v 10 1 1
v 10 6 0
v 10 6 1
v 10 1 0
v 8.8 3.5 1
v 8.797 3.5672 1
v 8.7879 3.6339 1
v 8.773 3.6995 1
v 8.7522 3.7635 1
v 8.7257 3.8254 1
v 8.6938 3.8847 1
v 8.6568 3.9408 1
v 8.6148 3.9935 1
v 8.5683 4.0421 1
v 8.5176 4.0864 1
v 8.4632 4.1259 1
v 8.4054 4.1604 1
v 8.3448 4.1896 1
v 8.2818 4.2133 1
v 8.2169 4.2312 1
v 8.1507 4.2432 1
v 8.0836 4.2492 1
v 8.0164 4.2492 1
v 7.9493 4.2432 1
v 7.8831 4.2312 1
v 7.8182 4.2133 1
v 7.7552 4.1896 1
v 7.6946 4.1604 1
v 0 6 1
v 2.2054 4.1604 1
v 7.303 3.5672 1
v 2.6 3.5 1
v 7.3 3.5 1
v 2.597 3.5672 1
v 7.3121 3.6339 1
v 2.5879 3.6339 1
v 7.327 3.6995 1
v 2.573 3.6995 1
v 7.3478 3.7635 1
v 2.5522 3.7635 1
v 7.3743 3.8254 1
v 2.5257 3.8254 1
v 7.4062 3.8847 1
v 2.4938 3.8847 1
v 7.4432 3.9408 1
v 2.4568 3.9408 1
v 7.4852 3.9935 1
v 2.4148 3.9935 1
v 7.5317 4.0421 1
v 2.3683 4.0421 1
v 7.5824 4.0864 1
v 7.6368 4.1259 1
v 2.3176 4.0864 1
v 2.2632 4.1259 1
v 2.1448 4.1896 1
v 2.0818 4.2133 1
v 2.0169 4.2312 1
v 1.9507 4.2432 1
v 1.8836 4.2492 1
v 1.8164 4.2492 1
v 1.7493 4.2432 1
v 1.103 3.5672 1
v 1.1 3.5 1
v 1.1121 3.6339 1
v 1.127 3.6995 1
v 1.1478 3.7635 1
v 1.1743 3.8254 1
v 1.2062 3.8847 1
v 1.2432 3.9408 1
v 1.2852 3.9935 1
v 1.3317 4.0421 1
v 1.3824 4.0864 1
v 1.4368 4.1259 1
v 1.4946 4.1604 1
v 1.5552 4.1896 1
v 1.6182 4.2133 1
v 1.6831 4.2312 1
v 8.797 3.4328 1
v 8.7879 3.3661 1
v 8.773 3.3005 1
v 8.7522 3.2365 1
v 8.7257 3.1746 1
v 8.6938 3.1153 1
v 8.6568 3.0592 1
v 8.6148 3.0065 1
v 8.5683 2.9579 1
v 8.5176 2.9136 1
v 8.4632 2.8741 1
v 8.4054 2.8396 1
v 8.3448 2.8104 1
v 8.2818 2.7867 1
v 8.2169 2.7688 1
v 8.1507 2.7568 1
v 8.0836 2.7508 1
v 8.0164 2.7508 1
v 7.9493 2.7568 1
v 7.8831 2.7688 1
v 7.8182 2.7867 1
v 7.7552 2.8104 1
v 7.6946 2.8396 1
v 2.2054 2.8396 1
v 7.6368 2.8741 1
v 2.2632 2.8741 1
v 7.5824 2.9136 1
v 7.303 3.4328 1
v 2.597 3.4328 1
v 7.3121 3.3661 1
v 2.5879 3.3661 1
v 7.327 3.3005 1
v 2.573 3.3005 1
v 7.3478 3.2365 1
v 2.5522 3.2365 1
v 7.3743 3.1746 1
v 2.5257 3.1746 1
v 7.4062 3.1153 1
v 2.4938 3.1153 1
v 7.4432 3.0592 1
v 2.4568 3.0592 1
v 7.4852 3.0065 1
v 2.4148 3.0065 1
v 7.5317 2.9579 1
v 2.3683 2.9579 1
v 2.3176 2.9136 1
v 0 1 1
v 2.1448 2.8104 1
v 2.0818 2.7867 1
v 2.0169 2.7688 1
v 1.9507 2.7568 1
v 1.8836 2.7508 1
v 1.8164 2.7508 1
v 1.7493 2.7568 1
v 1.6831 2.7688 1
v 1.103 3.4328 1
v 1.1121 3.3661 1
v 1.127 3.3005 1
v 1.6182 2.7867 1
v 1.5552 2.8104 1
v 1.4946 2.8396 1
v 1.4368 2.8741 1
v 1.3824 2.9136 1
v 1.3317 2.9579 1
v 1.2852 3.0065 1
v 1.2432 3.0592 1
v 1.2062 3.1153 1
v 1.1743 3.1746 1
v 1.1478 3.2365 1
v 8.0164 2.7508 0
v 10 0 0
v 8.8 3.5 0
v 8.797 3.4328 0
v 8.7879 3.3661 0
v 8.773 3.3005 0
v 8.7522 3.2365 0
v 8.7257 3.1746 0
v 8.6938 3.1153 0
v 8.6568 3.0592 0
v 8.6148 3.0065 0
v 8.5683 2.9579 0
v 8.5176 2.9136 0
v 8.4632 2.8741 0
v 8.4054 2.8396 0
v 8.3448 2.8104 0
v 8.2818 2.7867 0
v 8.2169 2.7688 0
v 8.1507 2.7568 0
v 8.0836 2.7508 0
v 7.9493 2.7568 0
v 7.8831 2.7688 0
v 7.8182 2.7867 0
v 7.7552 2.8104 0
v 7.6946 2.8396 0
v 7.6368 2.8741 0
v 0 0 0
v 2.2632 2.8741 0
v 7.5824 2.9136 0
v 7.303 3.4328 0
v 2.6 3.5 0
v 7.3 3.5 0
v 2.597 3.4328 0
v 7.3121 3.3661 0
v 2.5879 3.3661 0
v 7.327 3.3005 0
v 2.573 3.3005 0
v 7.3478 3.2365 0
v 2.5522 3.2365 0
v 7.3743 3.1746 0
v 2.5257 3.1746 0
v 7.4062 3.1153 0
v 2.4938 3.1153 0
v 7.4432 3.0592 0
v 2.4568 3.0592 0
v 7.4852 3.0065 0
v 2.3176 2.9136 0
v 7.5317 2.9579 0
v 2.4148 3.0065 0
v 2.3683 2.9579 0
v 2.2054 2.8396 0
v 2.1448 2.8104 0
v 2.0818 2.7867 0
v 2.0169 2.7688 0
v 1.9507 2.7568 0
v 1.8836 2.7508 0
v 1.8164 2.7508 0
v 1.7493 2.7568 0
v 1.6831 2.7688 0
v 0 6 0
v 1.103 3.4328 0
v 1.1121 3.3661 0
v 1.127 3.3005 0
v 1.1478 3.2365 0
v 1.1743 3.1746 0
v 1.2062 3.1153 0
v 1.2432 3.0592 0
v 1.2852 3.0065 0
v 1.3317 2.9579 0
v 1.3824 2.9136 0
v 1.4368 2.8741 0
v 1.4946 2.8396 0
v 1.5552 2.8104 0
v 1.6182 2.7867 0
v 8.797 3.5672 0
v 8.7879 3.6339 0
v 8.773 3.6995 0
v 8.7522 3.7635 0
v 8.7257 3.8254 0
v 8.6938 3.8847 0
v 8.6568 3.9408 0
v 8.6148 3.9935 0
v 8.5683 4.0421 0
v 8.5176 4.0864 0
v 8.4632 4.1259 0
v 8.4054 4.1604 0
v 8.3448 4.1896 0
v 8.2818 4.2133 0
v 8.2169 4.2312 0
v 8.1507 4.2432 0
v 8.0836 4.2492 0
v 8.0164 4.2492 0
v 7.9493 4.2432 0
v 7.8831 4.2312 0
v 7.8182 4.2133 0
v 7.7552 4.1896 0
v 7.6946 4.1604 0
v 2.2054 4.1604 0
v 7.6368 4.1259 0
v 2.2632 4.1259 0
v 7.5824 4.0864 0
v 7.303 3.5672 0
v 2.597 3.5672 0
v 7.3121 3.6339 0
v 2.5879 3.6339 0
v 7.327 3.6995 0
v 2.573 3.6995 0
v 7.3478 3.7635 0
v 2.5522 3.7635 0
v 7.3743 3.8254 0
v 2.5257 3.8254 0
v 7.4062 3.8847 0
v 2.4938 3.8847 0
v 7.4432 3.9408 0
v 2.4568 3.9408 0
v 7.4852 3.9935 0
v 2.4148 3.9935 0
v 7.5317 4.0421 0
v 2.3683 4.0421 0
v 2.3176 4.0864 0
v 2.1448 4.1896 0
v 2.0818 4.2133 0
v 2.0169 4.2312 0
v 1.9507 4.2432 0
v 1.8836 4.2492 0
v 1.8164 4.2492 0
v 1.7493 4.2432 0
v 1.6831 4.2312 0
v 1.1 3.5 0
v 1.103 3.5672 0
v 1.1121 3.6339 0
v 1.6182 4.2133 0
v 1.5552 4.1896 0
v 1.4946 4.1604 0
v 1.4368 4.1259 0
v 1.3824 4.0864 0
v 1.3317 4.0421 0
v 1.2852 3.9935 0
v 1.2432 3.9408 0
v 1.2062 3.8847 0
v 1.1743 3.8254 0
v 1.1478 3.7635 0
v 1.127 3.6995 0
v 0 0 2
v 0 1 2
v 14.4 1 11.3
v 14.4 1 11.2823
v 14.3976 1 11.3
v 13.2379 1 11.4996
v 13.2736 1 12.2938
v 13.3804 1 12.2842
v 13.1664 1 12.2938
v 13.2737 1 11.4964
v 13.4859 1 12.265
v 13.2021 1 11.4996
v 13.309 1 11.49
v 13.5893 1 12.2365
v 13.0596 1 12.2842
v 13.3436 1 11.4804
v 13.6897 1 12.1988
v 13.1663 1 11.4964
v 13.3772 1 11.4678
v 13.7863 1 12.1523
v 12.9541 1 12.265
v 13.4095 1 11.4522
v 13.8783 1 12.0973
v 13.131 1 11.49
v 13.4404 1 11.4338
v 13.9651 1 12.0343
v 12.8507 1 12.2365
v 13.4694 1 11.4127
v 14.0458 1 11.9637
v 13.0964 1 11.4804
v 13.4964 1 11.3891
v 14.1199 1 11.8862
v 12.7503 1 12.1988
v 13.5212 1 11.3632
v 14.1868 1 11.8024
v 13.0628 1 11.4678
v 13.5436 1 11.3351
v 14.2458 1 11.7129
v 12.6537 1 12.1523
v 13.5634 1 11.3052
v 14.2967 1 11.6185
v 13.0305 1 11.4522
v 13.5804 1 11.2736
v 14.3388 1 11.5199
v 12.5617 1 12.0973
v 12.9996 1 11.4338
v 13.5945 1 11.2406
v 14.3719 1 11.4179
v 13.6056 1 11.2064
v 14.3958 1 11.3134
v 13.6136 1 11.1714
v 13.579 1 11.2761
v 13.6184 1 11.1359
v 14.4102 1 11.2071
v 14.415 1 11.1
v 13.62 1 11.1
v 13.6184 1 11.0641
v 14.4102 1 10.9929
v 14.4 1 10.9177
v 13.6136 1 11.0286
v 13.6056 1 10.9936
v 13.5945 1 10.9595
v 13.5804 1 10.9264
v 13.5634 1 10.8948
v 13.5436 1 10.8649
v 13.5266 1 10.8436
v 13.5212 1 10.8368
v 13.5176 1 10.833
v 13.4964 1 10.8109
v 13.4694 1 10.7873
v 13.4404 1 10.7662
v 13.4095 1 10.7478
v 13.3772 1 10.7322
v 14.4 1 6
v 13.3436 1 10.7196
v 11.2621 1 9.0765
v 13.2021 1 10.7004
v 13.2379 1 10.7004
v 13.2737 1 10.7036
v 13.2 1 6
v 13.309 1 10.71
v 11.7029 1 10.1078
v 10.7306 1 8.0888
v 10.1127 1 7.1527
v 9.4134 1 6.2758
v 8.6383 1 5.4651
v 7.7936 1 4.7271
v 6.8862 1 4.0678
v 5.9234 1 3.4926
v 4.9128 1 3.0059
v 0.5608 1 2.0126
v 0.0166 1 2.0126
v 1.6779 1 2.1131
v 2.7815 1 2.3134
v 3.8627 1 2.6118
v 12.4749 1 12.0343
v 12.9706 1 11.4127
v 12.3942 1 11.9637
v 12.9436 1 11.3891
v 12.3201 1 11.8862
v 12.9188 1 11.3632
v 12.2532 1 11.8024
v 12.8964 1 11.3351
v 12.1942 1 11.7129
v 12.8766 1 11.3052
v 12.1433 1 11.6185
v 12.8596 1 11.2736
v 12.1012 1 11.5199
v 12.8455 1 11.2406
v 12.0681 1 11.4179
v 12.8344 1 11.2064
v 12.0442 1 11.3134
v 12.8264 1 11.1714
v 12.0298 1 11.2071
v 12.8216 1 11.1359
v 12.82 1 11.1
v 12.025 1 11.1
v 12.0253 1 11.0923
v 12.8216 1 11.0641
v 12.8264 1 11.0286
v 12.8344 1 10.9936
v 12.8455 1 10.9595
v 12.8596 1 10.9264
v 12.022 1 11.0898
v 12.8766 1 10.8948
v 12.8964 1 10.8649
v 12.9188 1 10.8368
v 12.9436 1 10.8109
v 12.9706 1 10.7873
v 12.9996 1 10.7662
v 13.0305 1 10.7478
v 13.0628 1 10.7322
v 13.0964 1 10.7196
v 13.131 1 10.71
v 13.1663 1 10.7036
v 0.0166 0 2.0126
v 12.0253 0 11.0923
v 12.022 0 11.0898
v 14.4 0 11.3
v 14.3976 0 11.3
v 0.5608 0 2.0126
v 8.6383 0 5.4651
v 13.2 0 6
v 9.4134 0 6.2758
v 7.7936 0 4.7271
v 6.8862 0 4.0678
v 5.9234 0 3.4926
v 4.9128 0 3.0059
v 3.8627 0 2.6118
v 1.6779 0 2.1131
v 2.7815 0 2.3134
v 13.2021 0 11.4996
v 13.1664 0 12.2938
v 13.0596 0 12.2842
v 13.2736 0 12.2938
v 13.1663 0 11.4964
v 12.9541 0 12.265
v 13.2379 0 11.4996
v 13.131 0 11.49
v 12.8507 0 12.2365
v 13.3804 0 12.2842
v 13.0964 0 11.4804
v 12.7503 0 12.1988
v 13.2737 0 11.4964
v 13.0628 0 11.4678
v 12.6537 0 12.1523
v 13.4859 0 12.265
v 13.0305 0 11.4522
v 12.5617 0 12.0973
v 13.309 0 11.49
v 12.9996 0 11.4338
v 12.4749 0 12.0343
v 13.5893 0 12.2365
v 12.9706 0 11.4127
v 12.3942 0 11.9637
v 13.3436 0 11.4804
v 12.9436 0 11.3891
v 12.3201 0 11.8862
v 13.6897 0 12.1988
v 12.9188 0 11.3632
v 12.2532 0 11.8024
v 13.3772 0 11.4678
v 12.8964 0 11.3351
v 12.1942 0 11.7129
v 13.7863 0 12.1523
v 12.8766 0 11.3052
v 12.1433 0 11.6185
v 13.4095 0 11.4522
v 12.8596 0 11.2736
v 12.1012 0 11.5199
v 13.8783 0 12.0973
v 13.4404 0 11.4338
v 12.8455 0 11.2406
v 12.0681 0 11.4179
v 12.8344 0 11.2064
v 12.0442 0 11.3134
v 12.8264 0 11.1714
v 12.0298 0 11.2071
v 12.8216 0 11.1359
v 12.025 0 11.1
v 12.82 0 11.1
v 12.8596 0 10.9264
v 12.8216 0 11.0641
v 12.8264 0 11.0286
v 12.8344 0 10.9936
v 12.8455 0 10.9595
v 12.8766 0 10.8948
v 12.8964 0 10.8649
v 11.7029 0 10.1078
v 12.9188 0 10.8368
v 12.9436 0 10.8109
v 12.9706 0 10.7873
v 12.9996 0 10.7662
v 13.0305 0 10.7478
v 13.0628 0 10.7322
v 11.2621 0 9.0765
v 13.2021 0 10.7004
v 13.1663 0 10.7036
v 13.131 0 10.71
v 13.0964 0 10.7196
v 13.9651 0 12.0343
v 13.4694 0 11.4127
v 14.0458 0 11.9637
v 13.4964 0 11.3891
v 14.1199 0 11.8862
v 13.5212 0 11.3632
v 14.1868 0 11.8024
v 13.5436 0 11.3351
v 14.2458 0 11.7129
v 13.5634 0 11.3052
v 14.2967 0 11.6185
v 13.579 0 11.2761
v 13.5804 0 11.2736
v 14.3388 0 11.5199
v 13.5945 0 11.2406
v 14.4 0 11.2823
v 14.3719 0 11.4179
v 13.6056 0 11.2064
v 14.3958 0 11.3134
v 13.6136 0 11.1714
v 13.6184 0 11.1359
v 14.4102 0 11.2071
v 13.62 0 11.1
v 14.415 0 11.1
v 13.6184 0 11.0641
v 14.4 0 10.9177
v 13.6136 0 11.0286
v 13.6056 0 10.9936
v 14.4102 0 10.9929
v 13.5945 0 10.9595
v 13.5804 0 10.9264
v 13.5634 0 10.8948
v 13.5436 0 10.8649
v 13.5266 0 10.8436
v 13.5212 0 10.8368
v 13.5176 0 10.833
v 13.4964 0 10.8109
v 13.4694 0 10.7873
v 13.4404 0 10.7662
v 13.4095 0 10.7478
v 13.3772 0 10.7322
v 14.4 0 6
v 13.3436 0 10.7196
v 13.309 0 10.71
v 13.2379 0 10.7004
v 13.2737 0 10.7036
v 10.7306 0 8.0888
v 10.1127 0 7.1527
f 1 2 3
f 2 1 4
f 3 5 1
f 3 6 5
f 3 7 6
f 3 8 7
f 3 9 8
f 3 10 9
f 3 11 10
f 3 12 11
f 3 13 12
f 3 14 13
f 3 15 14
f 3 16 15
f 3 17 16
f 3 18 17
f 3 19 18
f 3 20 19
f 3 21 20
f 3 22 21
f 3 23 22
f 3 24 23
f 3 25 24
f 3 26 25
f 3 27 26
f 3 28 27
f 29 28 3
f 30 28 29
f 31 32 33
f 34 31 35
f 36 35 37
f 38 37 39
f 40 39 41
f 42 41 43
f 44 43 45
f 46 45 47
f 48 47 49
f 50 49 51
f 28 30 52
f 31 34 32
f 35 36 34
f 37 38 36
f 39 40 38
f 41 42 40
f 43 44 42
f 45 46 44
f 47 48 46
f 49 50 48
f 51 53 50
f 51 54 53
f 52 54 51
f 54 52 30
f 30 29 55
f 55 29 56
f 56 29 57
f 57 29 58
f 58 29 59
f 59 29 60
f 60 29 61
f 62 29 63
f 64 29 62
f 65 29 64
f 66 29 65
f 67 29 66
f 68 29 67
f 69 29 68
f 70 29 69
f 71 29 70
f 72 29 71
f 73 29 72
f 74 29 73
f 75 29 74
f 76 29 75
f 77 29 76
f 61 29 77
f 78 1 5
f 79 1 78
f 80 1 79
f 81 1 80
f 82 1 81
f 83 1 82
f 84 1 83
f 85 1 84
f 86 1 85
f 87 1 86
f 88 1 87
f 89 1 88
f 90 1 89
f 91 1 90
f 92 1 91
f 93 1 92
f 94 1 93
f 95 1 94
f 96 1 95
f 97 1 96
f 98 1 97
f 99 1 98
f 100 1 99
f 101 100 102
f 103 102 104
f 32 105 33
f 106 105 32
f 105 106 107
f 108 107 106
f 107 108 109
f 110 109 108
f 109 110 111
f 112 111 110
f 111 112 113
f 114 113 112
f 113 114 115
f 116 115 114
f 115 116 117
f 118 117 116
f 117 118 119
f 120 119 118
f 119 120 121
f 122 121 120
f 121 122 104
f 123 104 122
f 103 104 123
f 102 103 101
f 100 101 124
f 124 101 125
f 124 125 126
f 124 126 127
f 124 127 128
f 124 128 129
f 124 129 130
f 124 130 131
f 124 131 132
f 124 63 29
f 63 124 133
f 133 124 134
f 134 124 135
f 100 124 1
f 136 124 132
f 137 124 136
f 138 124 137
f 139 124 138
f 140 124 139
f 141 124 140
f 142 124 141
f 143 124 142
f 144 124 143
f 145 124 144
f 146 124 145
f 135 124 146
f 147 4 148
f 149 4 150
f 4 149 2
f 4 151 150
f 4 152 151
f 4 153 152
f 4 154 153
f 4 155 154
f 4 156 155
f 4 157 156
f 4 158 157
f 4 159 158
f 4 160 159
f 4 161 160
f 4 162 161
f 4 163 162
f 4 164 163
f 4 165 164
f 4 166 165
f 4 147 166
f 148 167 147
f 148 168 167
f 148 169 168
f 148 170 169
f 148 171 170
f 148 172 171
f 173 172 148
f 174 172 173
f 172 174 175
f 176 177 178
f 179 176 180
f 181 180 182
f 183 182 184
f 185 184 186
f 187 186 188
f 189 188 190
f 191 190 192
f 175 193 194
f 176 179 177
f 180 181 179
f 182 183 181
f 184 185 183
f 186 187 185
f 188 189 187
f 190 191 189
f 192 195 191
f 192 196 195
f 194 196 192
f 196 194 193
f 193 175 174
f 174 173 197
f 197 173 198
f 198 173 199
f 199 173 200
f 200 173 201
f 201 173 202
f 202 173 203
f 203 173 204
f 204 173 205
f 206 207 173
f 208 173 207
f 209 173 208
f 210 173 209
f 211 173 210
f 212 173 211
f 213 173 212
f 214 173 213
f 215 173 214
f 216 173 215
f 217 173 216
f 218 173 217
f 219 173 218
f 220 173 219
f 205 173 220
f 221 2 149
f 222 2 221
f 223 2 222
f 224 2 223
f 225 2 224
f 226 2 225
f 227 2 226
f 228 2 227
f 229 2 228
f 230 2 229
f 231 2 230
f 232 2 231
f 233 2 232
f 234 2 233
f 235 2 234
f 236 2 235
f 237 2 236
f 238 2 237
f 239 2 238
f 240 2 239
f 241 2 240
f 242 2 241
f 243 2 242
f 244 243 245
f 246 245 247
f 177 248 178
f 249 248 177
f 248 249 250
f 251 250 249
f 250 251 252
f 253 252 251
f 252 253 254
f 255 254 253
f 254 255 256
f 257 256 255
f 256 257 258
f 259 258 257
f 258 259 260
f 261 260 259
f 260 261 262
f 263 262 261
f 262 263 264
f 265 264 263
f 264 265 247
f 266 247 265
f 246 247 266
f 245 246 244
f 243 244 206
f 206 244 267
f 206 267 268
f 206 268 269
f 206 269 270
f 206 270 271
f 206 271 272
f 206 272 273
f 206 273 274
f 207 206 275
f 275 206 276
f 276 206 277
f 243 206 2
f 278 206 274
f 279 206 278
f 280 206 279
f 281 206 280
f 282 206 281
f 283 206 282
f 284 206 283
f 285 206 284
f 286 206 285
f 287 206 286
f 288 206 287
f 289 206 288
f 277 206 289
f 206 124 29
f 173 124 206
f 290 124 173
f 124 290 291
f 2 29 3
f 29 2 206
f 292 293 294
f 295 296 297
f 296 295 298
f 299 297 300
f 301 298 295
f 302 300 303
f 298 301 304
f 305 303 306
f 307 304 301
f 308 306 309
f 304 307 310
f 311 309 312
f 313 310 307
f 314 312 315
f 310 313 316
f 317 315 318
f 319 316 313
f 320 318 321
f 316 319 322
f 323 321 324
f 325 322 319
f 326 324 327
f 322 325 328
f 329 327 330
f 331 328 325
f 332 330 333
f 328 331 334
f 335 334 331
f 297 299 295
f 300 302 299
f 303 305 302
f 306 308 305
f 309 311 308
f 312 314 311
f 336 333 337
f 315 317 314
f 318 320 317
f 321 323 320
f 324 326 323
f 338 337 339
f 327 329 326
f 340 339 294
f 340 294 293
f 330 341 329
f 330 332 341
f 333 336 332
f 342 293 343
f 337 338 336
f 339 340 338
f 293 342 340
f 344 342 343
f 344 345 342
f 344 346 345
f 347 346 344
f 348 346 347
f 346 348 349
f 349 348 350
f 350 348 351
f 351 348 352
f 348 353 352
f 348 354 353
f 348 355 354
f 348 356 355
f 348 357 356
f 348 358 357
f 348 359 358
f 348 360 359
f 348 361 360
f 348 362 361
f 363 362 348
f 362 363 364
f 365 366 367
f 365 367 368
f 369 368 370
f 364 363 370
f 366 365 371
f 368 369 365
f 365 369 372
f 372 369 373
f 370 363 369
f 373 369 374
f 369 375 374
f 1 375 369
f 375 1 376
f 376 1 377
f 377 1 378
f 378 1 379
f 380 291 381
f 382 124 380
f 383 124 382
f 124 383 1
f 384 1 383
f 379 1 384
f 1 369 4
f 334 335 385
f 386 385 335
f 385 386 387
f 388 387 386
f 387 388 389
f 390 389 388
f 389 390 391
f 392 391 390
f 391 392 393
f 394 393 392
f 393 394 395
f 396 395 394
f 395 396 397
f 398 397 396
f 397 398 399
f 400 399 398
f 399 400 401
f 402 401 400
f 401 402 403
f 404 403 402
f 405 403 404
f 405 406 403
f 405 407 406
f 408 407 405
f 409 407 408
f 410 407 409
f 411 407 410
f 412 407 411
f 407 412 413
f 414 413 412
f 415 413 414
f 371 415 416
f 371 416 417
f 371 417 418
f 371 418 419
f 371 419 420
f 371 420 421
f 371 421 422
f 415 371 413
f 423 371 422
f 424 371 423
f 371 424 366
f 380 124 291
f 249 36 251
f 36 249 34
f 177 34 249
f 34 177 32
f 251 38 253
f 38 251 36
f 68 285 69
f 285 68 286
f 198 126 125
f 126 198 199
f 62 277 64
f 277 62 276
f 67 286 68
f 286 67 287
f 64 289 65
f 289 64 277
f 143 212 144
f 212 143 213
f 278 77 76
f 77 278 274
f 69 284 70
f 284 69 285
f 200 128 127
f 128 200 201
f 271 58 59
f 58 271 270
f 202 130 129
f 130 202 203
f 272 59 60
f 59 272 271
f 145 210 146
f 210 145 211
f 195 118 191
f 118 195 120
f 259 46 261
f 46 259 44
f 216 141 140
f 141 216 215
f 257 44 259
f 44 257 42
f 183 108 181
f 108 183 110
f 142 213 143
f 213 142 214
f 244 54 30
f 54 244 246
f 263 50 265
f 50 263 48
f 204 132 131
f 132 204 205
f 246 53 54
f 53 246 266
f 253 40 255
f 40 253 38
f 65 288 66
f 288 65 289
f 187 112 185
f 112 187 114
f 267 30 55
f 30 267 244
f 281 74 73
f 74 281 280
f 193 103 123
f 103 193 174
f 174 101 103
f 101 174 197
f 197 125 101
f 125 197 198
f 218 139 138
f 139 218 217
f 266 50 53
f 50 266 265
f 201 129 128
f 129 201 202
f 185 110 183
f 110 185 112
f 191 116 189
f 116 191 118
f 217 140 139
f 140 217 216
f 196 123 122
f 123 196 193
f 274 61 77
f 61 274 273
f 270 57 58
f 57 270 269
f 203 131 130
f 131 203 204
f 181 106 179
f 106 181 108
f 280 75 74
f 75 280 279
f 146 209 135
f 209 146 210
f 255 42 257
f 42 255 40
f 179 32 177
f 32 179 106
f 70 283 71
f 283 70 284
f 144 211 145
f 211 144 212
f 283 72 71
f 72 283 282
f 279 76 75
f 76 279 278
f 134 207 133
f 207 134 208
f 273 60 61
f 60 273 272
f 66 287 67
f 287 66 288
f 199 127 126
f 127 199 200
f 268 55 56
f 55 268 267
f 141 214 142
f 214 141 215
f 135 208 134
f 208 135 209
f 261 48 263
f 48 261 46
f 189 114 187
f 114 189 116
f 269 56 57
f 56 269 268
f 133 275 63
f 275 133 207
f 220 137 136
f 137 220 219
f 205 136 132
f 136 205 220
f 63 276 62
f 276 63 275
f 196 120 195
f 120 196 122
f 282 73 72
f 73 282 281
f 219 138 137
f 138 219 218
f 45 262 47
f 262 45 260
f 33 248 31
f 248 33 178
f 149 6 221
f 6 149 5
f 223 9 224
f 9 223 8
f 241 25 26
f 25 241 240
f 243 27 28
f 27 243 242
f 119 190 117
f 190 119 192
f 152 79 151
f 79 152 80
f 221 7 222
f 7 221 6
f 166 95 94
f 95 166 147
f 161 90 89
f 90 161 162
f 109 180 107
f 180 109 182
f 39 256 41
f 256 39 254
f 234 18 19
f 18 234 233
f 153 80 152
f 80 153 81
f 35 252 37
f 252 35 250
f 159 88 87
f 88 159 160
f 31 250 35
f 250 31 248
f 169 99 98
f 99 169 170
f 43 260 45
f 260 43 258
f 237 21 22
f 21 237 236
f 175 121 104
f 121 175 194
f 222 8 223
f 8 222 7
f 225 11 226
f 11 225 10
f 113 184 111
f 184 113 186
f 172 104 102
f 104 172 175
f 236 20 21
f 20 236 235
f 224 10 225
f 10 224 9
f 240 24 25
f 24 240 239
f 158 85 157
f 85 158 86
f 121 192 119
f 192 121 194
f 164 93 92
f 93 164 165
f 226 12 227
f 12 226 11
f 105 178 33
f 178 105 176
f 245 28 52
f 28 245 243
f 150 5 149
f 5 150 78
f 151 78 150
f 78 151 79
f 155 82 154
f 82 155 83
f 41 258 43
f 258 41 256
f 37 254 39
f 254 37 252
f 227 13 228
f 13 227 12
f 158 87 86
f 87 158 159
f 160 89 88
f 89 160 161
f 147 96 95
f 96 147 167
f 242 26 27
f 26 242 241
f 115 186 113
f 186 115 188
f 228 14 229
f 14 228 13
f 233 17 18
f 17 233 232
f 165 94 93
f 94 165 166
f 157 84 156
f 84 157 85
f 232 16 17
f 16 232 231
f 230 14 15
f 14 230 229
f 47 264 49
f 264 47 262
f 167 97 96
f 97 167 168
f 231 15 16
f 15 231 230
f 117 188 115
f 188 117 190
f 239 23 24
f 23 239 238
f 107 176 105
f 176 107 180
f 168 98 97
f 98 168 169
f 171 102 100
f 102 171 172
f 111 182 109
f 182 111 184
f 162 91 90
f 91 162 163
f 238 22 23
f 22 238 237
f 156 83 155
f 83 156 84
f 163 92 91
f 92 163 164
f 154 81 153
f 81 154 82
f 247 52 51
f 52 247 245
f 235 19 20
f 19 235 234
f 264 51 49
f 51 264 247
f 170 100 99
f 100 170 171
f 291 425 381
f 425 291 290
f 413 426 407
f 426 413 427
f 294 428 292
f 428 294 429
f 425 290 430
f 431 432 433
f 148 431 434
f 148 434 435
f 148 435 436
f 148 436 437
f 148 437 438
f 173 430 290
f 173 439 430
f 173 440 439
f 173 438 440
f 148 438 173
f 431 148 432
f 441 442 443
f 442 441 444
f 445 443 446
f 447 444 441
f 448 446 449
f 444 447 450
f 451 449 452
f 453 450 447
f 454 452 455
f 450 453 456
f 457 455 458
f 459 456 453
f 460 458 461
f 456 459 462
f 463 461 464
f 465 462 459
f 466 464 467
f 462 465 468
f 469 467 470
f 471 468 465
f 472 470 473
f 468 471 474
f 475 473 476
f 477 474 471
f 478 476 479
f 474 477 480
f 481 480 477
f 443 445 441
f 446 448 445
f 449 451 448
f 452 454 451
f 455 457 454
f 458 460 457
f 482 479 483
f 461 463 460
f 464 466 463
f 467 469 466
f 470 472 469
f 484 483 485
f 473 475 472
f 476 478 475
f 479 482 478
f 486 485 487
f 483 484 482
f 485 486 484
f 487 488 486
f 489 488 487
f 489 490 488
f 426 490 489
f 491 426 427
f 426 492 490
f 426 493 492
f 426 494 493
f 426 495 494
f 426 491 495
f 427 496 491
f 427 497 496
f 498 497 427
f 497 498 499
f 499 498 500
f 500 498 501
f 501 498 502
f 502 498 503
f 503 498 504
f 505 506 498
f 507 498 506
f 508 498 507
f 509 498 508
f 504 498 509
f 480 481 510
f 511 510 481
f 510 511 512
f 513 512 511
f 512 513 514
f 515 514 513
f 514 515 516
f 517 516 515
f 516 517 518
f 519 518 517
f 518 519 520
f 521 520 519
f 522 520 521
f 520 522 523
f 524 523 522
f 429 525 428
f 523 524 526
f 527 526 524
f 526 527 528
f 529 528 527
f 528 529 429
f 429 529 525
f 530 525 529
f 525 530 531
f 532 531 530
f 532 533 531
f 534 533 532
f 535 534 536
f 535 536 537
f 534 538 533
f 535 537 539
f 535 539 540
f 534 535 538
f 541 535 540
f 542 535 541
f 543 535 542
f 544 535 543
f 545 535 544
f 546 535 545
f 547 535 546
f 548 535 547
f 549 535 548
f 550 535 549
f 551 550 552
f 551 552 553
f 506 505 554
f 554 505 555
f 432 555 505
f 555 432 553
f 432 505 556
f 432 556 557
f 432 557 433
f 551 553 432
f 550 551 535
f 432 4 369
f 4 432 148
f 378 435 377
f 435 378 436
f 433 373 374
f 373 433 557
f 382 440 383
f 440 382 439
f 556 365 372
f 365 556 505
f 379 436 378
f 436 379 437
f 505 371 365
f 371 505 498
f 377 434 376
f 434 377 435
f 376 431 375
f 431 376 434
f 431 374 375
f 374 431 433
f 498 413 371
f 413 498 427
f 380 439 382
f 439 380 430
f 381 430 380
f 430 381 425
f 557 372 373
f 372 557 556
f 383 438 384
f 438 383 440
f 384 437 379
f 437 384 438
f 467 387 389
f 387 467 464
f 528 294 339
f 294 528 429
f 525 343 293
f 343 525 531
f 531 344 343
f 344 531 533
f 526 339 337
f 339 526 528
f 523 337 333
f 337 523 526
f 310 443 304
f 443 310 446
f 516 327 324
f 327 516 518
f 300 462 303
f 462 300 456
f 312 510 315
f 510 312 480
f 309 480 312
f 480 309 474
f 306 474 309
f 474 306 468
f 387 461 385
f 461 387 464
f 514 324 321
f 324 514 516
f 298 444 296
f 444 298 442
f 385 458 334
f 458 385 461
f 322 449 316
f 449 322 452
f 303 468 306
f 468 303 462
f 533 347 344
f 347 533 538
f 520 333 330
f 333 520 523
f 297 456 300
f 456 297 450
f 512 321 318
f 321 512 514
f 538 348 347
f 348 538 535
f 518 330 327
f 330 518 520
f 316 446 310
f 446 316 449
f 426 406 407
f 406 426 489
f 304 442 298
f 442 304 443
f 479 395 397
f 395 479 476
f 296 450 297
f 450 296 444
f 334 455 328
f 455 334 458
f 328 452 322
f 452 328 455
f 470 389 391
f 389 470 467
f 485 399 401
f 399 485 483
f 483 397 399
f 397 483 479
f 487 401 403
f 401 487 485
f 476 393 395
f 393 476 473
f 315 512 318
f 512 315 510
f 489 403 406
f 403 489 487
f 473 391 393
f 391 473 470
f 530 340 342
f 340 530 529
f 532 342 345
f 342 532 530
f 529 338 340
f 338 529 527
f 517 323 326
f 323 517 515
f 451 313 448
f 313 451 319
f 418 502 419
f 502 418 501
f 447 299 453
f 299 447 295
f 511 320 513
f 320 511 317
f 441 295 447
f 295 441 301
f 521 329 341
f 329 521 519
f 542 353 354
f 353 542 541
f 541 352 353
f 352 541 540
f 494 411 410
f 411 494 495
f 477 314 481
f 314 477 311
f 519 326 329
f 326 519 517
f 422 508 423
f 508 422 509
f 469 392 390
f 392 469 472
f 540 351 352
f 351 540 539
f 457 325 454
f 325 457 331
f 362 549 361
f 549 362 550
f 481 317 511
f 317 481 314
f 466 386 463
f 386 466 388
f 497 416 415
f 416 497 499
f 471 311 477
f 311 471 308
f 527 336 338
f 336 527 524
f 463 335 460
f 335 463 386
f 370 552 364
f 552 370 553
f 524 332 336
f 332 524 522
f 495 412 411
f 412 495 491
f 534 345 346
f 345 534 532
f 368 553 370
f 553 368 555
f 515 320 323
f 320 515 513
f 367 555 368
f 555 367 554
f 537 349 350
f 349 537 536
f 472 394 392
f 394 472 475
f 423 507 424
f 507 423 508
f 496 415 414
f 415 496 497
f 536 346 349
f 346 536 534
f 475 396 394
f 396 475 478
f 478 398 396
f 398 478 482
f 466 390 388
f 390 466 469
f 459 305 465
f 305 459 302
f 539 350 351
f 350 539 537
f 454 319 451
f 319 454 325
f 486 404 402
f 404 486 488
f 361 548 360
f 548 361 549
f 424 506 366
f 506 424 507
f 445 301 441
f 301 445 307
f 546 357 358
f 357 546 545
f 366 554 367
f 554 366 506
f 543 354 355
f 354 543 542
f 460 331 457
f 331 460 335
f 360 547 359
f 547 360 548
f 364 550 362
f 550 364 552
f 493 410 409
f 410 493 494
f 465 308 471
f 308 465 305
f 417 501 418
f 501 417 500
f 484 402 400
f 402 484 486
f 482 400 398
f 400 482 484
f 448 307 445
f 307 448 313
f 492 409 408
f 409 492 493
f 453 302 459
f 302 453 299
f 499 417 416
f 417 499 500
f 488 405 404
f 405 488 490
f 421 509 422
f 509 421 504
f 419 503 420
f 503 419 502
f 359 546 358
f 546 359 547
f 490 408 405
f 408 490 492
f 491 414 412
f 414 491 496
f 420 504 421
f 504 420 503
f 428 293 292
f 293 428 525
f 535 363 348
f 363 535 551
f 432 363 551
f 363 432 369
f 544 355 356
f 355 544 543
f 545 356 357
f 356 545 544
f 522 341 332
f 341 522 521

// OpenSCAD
$fn = 70;

difference() {
    translate([0,1,0]) {
        cube([10,5,1]);
    }
    translate([1.85,3.5,0]) {
        cylinder(d = 1.5, h = 2);
    }
    translate([8.05,3.5,0]) {
        cylinder(d = 1.5, h = 2);
    }
}

difference() {
    hull() {
        cube([10,1,2]);
        translate([10+2.3,0,6]) {
            cube([0.9,1,5.3]);
        }
    }
    translate([10+3.22,1,11.1]) {
        translate([0,1,0]) {
            rotate([90,0,0]) {
               cylinder(d = 0.8, h = 3);
            }
        }
    }
    translate([0,1.1,14.5]) {
        rotate([90,0,0]) {
            cylinder(d = 25, h = 1.5);
        }
    }
}

translate([10+3.22,1,11.1]) {
    difference() {
        rotate([90,0,0]) {
            cylinder(d = 2.39, h = 1);
        }
        translate([0,1,0]) {
            rotate([90,0,0]) {
               cylinder(d = 0.8, h = 3);
            }
        }
    }
}

difference() {
    translate([10+2.3,0,6]) {
        cube([2.1,1,5.3]);
    }
    translate([10+3.22,1,11.1]) {
        translate([0,1,0]) {
            rotate([90,0,0]) {
               cylinder(d = 0.8, h = 3);
            }
        }
    }
}
        
